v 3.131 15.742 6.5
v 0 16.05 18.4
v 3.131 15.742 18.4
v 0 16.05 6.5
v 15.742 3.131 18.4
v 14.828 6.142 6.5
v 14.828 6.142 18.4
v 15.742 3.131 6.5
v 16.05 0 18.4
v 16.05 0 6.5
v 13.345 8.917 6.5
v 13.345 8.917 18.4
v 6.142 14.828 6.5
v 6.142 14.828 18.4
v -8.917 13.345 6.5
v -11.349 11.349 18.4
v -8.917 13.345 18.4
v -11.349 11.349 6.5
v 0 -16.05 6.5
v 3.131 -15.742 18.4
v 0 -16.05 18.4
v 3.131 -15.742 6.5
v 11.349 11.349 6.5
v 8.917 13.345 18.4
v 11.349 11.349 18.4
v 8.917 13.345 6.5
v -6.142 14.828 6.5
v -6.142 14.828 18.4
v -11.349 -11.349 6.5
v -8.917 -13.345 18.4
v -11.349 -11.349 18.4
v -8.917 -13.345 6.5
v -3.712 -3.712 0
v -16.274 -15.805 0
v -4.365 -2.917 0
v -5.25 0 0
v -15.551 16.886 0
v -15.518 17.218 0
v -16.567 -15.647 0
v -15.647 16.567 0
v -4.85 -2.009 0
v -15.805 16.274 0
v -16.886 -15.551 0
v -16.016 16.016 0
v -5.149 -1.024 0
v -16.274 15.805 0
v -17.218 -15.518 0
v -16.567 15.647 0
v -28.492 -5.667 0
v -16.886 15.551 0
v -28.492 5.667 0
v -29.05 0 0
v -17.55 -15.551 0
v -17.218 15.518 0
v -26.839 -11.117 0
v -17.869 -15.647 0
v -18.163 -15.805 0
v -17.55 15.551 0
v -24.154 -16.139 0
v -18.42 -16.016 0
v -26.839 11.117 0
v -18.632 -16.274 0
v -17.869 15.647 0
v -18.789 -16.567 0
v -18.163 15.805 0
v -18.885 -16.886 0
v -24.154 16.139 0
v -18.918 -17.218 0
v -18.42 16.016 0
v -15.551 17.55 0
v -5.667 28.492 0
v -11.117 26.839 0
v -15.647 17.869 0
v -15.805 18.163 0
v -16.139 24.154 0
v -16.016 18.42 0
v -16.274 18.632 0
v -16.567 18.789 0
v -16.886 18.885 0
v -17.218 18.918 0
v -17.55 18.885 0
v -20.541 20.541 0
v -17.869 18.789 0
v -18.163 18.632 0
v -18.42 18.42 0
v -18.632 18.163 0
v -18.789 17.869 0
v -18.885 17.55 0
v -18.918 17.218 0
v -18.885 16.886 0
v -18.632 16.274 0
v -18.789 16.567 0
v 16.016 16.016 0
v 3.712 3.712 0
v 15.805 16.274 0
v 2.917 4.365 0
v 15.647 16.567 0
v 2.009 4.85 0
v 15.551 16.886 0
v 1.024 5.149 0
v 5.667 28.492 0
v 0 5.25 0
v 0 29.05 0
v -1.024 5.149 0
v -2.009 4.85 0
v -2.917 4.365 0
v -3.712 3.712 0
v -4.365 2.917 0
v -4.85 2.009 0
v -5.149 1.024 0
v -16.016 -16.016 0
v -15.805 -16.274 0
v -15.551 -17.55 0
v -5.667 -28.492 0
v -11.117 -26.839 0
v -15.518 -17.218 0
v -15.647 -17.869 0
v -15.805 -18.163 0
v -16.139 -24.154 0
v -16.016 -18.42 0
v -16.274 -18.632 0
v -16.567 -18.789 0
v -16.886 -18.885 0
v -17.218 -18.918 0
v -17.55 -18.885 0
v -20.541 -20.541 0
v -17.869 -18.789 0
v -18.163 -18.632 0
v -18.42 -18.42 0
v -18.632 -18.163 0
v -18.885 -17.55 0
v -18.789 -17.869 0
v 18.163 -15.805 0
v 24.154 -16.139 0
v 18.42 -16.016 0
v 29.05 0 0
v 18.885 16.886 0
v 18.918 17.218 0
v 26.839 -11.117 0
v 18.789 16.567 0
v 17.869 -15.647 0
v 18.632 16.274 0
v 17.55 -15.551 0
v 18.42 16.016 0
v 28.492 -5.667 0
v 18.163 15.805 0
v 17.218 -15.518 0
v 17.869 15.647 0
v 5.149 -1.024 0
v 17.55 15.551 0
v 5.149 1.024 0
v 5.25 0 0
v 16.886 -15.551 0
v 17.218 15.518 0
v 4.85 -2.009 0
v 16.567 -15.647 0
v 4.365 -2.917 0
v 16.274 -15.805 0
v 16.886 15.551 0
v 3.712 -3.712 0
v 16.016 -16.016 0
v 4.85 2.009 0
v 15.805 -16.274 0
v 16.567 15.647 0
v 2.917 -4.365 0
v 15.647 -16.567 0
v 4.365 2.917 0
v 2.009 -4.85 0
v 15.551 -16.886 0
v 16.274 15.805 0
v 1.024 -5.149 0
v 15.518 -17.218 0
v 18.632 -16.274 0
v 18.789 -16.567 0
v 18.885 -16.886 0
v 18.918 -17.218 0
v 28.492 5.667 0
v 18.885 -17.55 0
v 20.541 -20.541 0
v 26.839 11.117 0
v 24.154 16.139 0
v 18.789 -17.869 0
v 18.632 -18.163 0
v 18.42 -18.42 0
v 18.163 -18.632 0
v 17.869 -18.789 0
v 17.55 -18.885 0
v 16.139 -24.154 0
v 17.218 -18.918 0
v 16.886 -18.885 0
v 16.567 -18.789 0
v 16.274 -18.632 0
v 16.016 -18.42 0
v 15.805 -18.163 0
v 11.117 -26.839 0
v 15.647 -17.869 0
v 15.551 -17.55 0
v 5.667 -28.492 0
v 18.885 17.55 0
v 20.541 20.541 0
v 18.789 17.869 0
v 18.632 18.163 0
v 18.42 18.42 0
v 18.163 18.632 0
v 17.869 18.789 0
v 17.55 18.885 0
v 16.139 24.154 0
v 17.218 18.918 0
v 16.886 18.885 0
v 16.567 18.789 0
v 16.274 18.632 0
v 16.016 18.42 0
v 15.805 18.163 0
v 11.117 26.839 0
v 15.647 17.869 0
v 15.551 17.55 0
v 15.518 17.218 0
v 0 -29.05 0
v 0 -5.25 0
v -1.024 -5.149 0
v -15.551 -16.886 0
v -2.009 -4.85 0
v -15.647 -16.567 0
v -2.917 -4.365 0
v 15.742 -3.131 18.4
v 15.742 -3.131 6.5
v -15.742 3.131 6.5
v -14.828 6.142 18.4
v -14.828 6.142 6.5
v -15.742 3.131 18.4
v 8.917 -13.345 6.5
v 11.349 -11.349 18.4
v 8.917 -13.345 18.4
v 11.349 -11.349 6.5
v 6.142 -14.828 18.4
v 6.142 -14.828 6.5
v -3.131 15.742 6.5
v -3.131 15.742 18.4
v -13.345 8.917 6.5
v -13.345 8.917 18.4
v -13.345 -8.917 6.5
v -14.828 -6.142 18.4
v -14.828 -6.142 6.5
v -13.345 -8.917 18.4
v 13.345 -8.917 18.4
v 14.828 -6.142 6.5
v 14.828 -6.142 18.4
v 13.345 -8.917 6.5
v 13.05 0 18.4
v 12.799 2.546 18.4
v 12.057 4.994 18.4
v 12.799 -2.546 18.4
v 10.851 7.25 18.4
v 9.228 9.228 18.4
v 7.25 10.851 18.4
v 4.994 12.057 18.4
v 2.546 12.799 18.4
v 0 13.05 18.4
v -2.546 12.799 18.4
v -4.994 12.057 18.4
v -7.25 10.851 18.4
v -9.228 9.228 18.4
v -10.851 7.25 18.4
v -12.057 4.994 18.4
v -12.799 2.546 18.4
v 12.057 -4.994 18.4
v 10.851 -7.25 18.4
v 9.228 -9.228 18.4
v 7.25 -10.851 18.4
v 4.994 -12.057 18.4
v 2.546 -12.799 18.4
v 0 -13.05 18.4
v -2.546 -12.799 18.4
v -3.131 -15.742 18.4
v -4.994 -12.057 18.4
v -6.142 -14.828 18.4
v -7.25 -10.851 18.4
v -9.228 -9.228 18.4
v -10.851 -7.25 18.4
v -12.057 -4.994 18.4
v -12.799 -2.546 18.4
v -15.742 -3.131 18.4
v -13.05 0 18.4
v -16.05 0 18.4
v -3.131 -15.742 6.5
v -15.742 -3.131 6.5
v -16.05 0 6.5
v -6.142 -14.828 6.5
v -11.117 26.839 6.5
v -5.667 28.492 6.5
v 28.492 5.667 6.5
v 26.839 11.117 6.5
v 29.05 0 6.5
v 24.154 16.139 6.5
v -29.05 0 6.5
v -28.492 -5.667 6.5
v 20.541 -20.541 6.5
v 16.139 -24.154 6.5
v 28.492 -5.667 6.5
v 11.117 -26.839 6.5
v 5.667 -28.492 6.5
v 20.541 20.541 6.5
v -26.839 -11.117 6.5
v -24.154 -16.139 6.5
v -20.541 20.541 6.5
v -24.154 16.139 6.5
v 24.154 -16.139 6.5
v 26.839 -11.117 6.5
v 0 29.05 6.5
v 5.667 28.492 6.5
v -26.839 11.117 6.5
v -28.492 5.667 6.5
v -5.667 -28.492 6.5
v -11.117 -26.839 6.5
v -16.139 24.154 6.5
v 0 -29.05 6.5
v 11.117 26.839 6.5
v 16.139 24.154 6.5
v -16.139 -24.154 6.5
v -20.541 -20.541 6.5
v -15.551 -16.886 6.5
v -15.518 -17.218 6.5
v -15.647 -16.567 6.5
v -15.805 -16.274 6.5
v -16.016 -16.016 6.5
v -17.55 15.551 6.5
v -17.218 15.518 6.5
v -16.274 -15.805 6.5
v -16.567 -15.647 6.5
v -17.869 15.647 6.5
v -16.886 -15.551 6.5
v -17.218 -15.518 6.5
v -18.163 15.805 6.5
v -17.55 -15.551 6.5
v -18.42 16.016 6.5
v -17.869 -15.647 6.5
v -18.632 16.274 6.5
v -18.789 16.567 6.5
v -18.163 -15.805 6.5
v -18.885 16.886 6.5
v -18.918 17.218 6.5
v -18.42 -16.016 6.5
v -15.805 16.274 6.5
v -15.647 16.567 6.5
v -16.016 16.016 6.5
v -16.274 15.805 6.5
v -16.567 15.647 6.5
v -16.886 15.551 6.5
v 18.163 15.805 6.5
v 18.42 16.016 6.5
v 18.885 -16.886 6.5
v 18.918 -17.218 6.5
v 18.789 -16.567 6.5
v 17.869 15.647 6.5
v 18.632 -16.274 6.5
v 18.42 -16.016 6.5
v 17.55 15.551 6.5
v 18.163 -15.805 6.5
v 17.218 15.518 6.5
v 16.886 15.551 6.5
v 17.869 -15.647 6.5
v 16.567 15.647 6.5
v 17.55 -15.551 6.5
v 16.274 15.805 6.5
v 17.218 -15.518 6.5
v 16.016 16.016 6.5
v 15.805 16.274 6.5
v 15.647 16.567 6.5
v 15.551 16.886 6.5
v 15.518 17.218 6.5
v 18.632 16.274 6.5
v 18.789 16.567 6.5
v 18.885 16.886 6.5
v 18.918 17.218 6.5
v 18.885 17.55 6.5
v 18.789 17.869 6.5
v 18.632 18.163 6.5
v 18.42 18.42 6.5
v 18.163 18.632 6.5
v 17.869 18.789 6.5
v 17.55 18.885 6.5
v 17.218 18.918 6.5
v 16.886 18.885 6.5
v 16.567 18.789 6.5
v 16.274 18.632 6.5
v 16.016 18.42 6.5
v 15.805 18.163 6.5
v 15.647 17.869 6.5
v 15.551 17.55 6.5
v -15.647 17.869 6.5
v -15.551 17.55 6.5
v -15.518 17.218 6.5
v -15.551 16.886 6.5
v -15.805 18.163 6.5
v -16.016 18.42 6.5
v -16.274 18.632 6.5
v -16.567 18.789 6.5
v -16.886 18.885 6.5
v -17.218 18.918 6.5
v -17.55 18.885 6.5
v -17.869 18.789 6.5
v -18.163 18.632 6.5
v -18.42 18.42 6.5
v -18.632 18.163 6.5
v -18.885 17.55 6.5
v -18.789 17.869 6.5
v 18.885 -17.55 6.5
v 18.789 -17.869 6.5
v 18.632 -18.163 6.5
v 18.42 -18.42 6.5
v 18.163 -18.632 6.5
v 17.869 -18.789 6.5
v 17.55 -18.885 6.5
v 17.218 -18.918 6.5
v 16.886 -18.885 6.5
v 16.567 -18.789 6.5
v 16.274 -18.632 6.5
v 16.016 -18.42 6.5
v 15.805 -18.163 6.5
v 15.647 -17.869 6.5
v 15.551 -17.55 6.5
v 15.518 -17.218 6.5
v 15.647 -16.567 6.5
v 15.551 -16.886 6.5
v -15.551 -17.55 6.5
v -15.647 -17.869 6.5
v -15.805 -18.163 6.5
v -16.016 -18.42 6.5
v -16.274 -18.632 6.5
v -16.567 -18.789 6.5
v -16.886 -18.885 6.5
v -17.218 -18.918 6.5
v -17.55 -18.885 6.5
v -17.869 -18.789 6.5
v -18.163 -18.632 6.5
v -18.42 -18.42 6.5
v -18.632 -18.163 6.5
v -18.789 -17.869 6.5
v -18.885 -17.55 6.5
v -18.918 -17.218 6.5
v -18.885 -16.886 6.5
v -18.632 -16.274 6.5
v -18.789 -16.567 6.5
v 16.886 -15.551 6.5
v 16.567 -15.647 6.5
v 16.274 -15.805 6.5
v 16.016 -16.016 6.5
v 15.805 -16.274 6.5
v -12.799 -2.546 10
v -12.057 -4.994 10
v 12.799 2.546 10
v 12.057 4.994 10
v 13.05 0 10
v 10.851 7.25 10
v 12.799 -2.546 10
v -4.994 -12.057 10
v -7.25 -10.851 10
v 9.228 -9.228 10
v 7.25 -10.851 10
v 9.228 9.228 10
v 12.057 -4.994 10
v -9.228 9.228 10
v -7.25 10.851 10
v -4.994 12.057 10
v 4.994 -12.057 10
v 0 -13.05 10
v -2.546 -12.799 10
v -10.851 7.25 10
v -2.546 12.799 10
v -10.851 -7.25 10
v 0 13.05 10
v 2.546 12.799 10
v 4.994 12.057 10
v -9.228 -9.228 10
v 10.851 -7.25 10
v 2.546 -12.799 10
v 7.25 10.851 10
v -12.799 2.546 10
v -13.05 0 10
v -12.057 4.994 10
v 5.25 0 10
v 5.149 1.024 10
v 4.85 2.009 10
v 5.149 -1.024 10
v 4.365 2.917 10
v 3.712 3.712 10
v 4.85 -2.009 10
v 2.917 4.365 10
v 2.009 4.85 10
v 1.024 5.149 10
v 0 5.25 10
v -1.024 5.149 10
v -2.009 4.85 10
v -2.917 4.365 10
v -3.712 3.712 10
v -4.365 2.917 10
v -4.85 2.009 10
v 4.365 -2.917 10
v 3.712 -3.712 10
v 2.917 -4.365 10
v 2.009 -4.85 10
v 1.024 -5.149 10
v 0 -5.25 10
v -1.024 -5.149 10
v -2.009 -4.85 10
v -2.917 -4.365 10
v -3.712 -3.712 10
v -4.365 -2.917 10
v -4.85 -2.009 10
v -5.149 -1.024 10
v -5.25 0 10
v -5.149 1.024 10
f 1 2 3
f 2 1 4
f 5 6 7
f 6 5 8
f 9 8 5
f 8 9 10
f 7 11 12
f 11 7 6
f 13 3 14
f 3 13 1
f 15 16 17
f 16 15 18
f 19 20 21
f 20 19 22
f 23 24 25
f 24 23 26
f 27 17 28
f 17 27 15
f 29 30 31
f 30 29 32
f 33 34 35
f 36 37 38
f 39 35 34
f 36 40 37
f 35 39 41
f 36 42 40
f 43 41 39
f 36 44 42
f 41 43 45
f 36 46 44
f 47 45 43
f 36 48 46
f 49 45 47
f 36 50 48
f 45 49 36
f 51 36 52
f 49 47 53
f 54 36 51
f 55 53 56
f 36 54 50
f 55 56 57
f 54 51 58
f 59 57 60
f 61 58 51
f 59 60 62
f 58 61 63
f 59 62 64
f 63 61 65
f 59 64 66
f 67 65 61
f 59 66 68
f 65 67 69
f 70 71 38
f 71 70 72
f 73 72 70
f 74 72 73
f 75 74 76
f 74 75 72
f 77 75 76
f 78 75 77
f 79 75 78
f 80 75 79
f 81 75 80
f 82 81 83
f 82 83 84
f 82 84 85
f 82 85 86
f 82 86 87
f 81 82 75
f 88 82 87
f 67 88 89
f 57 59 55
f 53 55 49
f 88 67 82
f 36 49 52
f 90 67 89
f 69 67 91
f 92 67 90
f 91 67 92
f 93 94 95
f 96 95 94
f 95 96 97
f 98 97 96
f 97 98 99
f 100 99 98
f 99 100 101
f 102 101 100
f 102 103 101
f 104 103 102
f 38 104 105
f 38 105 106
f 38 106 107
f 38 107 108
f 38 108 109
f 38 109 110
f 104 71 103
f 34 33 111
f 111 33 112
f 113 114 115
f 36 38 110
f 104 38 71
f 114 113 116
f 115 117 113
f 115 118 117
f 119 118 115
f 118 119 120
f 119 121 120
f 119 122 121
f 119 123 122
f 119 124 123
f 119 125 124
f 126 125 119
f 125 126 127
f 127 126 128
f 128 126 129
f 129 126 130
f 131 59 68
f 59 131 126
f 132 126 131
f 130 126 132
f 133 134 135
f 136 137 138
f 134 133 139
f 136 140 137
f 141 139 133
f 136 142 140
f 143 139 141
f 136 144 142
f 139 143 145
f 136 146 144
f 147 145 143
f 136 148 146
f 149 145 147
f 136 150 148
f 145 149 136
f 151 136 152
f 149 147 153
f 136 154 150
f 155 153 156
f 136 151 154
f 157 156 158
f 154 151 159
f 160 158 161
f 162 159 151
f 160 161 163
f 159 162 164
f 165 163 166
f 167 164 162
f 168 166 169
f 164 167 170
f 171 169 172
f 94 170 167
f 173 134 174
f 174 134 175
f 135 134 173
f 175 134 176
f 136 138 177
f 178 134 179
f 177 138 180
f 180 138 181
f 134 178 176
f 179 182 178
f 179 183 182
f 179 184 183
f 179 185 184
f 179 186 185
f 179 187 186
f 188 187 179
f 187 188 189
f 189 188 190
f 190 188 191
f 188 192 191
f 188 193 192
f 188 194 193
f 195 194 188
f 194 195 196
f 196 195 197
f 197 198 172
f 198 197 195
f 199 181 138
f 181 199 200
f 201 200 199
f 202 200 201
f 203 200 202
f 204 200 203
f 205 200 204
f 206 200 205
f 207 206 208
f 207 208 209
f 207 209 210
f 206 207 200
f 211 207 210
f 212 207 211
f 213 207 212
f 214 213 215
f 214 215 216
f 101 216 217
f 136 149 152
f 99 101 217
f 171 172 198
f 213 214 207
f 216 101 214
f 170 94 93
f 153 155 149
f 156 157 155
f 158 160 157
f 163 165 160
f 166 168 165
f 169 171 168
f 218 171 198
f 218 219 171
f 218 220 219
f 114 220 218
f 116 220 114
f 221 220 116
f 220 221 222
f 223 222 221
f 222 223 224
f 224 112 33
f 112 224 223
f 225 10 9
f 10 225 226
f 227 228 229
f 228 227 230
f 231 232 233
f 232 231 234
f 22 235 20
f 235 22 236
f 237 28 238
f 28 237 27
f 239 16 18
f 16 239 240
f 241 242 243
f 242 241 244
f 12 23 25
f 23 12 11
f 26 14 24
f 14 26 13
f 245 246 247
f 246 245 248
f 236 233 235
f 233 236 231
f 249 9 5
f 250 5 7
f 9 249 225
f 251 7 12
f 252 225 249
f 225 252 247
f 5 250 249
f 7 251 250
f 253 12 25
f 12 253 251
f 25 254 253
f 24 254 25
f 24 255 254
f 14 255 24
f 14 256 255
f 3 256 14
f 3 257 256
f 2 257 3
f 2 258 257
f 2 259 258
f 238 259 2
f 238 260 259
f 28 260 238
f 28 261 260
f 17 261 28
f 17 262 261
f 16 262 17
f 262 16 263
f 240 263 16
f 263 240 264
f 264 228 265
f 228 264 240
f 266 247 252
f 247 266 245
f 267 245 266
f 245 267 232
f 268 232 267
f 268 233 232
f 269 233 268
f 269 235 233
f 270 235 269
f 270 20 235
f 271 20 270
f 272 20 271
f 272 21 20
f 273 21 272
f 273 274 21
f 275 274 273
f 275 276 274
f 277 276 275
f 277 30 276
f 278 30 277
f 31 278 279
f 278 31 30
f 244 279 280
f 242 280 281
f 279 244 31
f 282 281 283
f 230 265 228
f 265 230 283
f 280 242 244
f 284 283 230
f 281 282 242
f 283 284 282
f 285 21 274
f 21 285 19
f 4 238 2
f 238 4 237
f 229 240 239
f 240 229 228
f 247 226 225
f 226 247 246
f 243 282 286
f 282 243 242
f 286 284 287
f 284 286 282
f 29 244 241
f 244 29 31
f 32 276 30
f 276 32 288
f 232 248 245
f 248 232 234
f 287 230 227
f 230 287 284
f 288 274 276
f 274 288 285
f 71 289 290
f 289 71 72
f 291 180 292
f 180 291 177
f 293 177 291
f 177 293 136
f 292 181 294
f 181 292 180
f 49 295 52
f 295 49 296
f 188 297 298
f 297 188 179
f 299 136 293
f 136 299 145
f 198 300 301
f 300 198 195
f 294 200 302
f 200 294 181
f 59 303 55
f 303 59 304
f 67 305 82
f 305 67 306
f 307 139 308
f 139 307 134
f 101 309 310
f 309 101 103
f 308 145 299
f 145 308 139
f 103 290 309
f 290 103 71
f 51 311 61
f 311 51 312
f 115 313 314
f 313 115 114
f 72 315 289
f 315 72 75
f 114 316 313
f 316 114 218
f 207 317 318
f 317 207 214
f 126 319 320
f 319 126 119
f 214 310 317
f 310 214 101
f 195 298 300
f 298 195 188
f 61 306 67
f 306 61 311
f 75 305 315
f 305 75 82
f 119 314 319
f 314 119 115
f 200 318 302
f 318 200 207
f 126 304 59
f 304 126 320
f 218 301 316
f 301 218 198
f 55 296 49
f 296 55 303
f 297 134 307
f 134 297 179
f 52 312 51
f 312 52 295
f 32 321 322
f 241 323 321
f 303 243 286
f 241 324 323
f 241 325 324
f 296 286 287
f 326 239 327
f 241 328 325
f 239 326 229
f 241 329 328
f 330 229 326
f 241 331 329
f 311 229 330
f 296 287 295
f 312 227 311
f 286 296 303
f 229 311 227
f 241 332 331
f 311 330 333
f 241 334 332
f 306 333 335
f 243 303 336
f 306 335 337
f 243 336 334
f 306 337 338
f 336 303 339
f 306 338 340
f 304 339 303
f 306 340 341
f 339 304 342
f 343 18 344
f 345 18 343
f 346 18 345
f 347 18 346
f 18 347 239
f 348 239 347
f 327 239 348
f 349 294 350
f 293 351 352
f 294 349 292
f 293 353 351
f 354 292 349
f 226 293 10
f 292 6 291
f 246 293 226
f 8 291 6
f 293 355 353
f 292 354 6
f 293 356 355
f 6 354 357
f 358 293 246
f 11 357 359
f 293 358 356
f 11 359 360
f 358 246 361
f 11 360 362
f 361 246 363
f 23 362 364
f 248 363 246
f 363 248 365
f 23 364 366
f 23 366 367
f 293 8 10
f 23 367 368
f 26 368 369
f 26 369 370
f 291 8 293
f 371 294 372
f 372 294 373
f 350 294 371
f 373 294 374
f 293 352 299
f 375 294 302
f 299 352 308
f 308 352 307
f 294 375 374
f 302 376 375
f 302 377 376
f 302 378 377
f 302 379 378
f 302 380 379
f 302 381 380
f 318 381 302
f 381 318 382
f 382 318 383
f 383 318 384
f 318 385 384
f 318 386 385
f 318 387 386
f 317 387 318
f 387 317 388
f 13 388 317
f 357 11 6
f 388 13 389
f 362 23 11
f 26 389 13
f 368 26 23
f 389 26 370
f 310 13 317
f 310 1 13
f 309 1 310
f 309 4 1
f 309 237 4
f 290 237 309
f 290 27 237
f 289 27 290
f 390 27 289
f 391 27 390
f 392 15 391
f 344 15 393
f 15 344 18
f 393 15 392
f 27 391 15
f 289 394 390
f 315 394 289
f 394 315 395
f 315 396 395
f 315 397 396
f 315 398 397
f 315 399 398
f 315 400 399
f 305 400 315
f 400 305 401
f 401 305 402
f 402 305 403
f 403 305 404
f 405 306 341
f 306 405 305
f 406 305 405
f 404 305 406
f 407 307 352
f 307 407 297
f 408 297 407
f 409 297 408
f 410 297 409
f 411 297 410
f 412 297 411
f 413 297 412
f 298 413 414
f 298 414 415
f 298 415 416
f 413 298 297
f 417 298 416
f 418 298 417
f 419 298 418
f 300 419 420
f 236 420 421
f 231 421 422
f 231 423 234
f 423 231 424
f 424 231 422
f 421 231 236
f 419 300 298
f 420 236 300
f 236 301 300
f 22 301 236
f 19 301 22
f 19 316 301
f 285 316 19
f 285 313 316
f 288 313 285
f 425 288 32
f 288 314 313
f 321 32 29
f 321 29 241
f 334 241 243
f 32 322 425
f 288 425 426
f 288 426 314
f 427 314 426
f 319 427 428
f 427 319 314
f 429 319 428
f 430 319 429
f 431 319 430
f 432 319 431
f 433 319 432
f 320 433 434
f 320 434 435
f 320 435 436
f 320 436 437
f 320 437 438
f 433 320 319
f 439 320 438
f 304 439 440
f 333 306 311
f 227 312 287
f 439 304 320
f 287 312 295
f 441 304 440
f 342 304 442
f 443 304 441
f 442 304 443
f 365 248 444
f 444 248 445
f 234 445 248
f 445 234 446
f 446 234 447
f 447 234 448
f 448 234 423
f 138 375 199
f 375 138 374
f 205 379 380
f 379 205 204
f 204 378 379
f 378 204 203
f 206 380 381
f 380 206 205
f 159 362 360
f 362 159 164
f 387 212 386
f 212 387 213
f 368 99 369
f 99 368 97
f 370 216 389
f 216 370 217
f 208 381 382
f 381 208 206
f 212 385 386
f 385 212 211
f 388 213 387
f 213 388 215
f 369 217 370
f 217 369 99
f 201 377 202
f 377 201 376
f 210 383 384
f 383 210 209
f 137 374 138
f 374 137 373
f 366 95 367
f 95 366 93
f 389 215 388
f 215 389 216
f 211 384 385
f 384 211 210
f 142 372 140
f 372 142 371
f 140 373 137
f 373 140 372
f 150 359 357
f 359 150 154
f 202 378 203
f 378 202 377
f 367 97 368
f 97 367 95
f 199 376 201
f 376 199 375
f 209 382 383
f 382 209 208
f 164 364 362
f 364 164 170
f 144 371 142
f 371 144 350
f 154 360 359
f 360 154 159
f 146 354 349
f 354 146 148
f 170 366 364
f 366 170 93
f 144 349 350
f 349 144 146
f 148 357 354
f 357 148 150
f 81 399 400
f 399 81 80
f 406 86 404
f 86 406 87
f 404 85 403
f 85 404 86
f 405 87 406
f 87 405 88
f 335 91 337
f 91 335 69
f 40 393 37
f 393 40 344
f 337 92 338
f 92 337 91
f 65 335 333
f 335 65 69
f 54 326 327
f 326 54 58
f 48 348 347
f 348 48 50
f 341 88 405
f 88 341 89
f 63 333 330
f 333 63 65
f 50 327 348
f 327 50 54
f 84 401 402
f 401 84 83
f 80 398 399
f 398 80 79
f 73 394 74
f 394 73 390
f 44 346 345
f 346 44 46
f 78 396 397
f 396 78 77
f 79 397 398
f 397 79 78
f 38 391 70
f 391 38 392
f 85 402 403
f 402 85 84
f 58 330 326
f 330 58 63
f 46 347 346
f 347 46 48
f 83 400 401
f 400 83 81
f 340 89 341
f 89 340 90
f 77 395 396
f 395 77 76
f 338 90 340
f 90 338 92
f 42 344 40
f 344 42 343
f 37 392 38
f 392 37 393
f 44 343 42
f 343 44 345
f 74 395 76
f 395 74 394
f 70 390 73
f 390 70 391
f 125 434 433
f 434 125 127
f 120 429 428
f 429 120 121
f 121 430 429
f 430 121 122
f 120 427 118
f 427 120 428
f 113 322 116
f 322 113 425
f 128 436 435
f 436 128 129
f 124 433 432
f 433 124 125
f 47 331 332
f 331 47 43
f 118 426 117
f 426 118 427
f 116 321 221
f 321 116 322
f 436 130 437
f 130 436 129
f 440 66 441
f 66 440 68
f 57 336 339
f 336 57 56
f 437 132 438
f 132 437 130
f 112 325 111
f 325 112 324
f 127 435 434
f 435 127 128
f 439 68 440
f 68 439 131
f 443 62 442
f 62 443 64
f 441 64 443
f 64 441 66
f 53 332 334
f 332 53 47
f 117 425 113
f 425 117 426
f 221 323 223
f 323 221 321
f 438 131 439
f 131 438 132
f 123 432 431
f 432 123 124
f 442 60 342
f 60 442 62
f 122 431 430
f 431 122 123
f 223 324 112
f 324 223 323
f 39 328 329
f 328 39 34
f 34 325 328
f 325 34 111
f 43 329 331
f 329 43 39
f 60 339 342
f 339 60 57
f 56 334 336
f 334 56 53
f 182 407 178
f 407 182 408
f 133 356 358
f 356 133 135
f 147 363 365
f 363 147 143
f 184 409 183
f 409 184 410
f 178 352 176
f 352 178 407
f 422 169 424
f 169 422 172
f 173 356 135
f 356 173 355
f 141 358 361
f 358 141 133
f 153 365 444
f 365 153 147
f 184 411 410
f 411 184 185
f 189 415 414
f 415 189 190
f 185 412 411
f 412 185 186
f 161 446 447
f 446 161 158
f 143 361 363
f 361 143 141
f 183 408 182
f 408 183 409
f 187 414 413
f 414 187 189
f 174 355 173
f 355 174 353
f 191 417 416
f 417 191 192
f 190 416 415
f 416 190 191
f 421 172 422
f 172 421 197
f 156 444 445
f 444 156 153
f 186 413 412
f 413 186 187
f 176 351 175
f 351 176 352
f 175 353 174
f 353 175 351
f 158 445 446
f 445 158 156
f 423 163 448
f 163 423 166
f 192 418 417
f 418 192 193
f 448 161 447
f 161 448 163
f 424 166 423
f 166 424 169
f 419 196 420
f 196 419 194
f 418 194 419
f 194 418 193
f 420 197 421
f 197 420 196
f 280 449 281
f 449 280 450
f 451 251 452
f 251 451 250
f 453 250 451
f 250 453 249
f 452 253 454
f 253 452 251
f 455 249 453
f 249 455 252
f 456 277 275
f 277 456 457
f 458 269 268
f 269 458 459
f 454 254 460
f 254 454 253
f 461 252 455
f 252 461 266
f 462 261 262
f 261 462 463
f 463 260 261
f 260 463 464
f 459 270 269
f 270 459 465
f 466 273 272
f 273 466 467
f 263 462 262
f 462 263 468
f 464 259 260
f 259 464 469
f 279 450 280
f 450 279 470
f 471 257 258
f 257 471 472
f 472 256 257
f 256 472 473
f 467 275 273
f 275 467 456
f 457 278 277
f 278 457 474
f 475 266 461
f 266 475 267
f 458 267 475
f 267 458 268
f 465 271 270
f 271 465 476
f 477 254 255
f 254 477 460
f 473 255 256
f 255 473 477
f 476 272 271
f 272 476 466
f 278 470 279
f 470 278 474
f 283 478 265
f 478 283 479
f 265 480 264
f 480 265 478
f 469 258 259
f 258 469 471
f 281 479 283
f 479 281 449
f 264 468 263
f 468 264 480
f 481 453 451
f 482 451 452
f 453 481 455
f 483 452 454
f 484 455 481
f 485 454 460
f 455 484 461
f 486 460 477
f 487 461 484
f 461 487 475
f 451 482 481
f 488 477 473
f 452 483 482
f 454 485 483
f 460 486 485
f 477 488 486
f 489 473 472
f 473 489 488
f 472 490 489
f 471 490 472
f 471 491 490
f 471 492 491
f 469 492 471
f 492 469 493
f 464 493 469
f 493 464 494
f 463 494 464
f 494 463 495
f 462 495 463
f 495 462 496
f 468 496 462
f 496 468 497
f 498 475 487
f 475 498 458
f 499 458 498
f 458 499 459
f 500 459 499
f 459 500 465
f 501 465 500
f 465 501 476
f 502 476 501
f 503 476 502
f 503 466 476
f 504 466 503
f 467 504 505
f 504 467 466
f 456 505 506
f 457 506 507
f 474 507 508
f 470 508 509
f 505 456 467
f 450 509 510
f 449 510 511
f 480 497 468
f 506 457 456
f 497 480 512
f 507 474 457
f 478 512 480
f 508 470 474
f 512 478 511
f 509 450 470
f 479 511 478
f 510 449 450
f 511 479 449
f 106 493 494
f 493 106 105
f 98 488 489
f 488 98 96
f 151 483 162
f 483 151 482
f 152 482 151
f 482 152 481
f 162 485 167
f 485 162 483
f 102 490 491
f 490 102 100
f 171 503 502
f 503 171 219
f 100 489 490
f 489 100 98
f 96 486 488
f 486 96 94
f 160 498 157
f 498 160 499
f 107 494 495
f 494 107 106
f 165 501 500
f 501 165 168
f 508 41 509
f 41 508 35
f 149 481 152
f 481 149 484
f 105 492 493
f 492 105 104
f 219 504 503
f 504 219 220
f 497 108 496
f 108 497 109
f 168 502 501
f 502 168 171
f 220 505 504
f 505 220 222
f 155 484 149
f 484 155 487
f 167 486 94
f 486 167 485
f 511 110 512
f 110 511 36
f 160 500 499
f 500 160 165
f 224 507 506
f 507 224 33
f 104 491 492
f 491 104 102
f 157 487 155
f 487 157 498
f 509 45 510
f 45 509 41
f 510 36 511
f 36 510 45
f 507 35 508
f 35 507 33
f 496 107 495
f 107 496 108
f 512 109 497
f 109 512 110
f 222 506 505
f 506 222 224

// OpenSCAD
$fn = 32;

// ----------------------------------------------------------------------
// Bearing housing: seat for 6000 (26 x 8 mm), 32.1 mm body
// ----------------------------------------------------------------------

// --- parameters (mm) ---
housing_d = 32.1;         // housing outside diameter
housing_h = 18.4;         // overall housing height
wall_t = 3;               // wall thickness
seat_d = 26.1;            // 6000 seat, 0.1 mm clearance
seat_h = 8.4;             // pocket depth
shoulder = 5;             // shoulder under the bearing
pass_d = 10.5;            // shaft passage
flange_d = 58.1;          // mounting flange diameter
flange_t = 5;             // flange thickness
bolt_d = 3.4;             // flange bolt clearance
bolt_r = 24.35;           // flange bolt circle radius

module body() {
  cylinder(h = housing_h, d = housing_d);
}

module flange() {
  /* flange sunk 1.5 mm into the body */
  cylinder(h = flange_t + 1.5, d = flange_d);
}

difference() {
  union() {
    body();
    flange();
  }
  translate([0, 0, housing_h - seat_h]) cylinder(h = seat_h + 1, d = seat_d);
  translate([0, 0, -1]) cylinder(h = housing_h - seat_h + 1, d = pass_d);
  for (i = [0 : 3]) rotate([0, 0, 45 + i * 90]) translate([bolt_r, 0, -1])
    cylinder(h = flange_t + 3, d = bolt_d);
}
